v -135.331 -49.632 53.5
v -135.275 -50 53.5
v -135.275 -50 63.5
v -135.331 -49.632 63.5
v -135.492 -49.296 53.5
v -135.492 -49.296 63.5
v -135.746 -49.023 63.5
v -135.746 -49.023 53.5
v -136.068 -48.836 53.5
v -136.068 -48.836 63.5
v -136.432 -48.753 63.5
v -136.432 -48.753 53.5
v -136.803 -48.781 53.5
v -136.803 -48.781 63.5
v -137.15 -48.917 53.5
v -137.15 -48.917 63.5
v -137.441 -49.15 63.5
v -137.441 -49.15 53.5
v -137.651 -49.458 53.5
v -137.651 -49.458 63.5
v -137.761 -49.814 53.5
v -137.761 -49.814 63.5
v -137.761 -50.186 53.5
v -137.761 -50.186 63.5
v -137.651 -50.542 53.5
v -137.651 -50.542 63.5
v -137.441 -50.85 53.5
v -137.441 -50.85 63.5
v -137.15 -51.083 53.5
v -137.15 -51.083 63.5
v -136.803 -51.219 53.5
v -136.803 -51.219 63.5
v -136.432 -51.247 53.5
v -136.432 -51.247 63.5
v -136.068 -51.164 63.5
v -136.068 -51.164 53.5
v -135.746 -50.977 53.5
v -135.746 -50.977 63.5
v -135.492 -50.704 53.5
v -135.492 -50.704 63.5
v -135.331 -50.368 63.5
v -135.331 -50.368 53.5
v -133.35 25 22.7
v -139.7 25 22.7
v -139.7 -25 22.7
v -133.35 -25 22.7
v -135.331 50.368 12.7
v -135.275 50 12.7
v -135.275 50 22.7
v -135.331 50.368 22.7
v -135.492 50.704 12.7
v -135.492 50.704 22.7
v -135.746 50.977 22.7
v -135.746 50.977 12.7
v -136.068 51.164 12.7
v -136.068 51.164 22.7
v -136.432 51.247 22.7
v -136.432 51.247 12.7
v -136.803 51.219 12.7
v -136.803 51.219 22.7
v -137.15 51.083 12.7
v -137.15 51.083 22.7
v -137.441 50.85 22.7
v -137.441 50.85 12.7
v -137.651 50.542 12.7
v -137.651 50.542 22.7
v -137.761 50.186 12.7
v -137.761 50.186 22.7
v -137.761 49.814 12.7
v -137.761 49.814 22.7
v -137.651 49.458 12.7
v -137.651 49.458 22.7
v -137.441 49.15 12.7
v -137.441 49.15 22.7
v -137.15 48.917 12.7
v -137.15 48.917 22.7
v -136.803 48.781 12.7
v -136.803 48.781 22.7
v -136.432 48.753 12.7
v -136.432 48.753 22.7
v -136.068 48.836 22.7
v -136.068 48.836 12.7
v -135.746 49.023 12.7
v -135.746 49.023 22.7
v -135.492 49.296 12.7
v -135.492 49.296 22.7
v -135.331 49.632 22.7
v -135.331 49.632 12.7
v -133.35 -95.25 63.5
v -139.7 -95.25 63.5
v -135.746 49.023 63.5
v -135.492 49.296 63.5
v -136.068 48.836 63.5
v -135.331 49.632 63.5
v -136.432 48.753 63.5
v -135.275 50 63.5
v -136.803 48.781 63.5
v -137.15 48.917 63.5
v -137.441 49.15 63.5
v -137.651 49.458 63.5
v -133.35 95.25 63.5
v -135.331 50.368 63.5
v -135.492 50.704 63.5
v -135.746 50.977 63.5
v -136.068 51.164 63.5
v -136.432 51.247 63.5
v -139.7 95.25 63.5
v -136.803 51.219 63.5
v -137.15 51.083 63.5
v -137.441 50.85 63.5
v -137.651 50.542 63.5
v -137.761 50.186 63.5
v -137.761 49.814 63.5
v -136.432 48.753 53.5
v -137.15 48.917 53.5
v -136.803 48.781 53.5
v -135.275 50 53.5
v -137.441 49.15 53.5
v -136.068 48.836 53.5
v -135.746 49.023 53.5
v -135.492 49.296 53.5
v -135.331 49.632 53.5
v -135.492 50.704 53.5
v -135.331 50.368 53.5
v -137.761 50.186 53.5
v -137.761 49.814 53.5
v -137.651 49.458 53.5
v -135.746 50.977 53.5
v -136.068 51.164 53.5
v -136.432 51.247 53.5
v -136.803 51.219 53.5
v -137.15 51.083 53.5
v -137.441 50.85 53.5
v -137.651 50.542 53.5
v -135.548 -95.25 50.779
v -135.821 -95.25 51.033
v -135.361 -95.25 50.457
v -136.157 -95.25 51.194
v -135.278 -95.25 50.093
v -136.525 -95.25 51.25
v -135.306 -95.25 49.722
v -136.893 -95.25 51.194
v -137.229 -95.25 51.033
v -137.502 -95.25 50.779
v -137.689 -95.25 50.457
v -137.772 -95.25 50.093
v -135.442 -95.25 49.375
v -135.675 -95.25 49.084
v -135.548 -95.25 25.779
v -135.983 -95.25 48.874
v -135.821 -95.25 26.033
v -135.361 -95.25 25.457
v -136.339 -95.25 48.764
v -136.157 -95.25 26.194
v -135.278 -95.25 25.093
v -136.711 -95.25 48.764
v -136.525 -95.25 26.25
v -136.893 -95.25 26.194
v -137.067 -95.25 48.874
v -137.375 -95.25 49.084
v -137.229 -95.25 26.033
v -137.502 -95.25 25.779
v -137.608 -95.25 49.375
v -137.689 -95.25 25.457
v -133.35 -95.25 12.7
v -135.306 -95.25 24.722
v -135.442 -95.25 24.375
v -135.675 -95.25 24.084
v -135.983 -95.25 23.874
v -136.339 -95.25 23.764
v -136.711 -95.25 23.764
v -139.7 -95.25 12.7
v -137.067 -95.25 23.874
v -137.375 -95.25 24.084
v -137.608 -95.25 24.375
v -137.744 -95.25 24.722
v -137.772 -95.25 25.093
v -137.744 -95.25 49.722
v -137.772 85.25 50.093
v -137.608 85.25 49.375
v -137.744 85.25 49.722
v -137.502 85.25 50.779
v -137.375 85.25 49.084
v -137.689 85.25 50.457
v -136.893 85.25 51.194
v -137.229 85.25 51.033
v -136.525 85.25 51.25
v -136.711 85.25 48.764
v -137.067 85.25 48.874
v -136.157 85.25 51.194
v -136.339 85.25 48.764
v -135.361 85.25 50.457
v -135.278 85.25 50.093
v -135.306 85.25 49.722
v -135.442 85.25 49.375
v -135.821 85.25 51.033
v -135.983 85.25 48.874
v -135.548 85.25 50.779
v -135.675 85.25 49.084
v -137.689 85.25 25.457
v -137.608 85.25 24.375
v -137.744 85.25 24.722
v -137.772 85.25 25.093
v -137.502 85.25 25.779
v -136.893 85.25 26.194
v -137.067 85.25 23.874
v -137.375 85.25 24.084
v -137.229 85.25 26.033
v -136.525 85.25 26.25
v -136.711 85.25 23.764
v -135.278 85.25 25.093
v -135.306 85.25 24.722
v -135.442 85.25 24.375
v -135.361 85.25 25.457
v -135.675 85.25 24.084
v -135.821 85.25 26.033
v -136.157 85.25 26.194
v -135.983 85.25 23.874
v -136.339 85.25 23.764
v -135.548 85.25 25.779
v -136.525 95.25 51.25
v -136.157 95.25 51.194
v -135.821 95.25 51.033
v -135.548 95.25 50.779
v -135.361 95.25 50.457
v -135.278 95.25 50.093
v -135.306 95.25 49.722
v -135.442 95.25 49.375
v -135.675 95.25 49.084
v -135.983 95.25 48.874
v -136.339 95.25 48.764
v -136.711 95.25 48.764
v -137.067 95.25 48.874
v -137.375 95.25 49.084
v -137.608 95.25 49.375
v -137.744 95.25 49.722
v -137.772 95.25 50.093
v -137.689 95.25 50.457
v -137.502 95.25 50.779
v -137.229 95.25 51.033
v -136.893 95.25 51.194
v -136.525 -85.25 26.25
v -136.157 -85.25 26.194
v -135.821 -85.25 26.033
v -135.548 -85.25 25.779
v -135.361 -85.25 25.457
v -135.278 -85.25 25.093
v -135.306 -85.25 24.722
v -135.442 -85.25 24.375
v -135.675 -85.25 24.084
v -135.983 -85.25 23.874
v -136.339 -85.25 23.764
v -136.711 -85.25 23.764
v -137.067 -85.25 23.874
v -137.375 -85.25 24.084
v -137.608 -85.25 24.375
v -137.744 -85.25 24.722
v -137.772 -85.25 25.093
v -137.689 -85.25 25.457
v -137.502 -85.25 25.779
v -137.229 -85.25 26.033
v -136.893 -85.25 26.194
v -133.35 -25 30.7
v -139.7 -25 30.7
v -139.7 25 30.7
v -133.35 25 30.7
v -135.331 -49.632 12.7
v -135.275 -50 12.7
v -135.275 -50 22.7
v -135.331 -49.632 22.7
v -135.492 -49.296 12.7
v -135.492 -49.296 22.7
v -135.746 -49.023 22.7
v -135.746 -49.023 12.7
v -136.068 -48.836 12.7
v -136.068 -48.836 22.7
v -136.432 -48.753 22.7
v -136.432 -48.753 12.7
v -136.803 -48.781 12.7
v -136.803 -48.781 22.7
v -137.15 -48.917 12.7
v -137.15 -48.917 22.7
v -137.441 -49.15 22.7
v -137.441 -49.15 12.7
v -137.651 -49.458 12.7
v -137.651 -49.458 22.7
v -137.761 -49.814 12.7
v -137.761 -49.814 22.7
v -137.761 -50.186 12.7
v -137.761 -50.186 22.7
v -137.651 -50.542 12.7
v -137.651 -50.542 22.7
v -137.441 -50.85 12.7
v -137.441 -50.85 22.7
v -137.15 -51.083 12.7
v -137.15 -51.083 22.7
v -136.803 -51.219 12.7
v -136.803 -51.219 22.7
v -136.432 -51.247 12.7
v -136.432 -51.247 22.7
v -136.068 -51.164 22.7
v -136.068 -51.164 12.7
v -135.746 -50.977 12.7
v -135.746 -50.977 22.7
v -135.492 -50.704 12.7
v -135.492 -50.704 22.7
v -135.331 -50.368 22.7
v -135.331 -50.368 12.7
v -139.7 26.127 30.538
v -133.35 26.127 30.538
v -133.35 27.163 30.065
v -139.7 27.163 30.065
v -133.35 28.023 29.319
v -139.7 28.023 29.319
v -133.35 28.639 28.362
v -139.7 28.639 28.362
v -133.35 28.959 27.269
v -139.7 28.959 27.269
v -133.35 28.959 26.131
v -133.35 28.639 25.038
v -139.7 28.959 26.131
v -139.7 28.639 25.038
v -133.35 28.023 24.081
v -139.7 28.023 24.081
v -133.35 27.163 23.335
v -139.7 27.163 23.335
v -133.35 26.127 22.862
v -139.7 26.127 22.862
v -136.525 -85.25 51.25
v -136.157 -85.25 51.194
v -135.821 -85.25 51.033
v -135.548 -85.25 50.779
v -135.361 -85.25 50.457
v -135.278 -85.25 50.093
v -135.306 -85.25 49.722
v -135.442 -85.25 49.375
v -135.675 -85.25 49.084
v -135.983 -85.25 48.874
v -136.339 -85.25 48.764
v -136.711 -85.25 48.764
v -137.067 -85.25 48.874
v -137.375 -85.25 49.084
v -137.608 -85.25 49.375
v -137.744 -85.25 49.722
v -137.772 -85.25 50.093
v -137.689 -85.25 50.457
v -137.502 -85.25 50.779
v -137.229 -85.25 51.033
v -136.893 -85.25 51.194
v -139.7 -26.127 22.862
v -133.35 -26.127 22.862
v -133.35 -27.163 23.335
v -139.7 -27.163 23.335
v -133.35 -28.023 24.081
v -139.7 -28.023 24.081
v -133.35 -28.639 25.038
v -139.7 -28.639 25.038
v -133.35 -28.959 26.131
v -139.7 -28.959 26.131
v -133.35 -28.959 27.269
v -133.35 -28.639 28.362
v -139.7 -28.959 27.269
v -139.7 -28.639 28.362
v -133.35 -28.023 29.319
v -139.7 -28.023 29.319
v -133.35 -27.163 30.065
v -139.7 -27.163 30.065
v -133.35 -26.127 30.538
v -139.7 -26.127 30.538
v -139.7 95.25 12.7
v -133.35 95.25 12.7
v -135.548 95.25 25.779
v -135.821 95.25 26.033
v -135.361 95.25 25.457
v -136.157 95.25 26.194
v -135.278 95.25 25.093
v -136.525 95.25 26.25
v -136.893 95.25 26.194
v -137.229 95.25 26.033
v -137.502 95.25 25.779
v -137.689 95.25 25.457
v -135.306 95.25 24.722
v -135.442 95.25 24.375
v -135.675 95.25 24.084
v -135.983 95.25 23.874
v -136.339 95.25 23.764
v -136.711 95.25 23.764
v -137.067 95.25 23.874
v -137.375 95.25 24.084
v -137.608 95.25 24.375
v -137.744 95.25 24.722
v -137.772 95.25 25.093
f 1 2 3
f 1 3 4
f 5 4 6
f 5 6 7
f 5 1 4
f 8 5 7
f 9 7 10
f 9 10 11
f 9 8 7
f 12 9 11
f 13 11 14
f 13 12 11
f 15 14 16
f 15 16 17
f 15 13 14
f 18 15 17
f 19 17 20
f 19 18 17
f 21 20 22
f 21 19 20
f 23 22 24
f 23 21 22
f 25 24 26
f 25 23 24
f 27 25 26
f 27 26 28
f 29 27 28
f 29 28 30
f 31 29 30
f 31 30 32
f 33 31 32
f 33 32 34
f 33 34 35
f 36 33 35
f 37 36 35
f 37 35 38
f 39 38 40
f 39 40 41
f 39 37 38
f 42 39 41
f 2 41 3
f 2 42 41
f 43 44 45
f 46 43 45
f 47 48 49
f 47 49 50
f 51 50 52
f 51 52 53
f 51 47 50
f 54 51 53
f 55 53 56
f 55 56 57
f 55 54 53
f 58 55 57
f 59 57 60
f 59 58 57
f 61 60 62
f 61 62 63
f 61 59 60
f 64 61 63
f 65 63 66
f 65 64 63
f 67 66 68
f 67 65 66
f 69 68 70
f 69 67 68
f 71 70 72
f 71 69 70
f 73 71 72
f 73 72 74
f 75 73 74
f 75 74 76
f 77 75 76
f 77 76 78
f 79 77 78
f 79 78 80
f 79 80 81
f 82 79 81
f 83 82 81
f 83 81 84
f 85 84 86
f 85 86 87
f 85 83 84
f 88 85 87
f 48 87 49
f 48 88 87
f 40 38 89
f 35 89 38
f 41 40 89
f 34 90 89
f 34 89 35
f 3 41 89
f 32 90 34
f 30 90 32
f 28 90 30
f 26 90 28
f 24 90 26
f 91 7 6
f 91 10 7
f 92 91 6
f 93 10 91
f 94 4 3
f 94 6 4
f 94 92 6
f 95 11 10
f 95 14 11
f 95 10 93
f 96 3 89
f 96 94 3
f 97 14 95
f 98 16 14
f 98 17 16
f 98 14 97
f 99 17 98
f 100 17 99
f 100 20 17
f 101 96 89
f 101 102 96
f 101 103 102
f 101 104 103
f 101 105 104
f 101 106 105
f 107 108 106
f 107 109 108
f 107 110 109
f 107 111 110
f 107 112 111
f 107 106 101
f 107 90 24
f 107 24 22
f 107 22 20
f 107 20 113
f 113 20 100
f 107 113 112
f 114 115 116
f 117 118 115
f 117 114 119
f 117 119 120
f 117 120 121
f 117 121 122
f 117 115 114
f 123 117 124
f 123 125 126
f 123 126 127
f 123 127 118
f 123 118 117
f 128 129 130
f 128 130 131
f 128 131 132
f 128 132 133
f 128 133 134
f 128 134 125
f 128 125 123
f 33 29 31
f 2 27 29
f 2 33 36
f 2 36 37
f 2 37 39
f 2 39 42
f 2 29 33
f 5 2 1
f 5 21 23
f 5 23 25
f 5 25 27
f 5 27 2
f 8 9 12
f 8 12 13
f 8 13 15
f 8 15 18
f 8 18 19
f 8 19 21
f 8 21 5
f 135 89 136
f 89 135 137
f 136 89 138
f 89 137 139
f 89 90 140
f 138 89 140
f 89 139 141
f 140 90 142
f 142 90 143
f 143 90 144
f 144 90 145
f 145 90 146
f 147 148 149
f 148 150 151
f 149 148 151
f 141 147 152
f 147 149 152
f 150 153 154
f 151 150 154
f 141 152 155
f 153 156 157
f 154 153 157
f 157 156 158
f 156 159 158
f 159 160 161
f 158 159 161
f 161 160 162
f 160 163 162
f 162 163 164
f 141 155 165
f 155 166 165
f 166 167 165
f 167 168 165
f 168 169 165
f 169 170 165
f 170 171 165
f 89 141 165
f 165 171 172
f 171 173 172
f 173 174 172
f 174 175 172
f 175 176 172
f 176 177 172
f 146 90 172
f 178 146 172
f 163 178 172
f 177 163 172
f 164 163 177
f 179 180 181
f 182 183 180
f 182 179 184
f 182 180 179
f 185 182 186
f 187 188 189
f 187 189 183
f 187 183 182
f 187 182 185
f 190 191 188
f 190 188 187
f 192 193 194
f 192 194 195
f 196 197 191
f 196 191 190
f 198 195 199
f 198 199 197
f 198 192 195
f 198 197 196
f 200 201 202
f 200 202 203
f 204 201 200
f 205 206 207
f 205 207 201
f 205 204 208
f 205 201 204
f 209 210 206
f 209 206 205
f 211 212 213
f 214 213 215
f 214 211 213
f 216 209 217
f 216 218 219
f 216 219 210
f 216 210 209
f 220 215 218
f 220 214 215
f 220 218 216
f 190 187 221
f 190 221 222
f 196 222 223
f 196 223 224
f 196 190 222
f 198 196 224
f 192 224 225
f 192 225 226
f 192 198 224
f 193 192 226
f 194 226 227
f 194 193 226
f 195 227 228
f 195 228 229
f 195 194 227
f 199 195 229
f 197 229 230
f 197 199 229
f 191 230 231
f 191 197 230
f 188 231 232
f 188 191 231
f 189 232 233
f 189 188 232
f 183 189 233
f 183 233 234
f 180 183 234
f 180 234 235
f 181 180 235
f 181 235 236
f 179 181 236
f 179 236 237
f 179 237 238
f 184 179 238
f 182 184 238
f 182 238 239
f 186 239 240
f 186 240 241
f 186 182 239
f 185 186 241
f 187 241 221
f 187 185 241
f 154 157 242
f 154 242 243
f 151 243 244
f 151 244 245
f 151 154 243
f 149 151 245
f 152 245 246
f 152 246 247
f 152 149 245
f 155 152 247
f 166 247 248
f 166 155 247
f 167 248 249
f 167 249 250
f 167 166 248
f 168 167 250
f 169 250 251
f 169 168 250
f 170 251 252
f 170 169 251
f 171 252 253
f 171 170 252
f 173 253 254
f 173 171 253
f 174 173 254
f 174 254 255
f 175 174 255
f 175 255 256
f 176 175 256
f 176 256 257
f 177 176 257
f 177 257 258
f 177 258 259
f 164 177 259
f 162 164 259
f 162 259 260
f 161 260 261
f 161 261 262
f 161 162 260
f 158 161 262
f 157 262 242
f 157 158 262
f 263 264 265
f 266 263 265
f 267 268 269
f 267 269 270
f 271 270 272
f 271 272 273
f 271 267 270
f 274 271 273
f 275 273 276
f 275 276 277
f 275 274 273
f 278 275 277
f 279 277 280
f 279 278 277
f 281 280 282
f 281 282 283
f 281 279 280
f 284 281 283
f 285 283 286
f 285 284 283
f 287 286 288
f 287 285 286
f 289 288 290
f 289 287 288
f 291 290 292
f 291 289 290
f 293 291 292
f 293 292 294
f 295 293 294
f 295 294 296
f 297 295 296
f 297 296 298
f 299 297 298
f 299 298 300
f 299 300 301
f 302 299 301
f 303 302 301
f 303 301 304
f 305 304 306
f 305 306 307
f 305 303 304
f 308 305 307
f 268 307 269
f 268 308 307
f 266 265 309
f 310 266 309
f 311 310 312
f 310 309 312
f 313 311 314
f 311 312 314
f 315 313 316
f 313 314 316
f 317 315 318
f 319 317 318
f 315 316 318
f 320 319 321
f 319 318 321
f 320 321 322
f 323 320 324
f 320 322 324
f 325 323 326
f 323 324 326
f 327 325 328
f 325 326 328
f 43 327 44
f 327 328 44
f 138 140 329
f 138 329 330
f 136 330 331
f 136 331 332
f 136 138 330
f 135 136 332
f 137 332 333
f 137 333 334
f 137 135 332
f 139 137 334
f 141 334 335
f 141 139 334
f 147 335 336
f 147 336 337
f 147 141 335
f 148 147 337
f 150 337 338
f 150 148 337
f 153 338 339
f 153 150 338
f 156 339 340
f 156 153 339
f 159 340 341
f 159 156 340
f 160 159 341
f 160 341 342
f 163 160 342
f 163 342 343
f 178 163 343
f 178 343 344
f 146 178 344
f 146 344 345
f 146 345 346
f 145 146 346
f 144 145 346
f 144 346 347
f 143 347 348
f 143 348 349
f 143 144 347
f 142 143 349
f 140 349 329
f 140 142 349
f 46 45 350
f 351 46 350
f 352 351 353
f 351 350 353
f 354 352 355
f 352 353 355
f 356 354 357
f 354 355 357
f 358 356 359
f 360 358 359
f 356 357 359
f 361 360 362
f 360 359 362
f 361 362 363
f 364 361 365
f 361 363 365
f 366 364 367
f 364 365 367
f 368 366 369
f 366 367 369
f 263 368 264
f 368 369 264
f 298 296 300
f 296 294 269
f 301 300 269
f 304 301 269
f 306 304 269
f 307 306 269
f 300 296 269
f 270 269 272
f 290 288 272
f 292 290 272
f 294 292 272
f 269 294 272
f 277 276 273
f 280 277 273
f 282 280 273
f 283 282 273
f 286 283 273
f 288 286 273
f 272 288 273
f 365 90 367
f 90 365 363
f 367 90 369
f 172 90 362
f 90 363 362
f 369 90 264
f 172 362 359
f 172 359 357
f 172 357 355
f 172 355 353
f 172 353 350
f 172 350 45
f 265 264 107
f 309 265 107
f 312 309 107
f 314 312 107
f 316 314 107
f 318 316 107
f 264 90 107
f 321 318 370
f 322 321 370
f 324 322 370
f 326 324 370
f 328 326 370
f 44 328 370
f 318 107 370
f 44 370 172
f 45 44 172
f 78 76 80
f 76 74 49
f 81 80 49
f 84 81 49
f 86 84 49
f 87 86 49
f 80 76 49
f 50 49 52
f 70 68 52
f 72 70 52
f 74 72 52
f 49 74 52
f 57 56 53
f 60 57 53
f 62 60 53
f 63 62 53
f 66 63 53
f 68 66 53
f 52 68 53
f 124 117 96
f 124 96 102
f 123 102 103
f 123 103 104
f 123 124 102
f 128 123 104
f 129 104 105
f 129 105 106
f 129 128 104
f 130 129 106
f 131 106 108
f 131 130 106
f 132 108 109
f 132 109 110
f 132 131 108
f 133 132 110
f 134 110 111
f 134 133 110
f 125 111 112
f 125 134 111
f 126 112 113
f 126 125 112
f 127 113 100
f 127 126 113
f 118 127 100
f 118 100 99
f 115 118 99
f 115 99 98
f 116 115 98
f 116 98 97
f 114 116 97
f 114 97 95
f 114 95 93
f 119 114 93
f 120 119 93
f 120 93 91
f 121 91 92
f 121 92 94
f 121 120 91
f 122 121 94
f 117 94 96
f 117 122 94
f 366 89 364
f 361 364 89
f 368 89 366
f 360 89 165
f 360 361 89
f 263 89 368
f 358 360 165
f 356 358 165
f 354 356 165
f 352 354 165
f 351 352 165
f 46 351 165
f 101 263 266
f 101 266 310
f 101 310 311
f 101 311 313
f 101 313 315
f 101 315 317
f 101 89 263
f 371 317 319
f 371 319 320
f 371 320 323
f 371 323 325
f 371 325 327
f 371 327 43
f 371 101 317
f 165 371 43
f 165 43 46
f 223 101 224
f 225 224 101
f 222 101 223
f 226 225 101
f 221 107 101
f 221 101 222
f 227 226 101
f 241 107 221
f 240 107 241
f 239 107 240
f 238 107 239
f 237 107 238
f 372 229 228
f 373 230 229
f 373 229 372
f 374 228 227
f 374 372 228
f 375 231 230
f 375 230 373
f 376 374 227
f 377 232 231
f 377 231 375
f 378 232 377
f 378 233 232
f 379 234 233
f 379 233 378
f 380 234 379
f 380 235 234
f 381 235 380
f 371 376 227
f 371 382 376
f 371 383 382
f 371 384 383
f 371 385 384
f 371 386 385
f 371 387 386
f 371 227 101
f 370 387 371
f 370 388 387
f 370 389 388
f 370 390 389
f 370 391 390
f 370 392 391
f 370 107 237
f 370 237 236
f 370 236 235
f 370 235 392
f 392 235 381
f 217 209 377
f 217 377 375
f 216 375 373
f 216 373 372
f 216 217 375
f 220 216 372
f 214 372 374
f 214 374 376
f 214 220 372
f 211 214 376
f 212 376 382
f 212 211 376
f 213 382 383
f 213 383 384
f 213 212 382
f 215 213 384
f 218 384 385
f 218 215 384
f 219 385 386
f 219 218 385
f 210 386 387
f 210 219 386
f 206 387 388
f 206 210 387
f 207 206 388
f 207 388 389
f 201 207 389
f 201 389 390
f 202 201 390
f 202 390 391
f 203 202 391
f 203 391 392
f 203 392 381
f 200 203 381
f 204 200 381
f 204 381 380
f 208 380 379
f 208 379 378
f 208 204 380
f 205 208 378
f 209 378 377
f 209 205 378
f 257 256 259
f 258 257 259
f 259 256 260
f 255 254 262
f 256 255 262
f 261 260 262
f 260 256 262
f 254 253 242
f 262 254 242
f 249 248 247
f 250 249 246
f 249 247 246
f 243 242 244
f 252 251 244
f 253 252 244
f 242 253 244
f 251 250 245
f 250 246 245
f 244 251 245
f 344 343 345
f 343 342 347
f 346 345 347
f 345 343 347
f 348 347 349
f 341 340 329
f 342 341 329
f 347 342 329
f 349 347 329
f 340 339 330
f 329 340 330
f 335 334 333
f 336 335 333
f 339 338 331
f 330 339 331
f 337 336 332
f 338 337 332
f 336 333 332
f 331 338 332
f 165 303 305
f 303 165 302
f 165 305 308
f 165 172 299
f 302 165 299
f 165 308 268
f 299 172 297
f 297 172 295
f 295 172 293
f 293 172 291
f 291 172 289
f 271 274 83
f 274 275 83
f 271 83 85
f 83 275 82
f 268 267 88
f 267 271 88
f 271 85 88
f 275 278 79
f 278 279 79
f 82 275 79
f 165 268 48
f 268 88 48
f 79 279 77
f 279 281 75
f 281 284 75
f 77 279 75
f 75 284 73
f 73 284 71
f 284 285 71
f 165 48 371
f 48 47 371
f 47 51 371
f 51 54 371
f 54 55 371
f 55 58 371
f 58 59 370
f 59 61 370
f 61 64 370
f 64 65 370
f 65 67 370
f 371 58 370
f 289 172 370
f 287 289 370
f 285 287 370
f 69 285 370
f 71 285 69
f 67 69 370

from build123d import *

# Parameters (mm, degrees)
PARED_X_1_4IN_START           = -139.7
CROQUIS1_W                    = 50.8
CROQUIS1_H                    = 190.5
PARED_X_1_4IN_DEPTH           = 6.35
ROSCA_M3_INFERIOR_START       = 12.7
CROQUIS2_R                    = 1.25
ROSCA_M3_INFERIOR_DEPTH       = 10
ROSCA_M3_SUPERIOR_START       = 53.5
CROQUIS3_R                    = 1.25
ROSCA_M3_SUPERIOR_DEPTH       = 10
ROSCA_M3_ESQUINA_Y_START      = 85.25
CROQUIS4_R                    = 1.25
ROSCA_M3_ESQUINA_Y_DEPTH      = 10
ROSCA_M3_ESQUINA_Y_START_2    = -95.25
CROQUIS5_R                    = 1.25
ROSCA_M3_ESQUINA_Y_2_DEPTH    = 10
PASO_CABLE_ALIMENTACION_START = -139.7
PASO_CABLE_ALIMENTACION_DEPTH = 6.35


with BuildPart() as part:
    # Croquis1 → Pared_X_1-4in (new body)
    with BuildSketch(Plane(origin=(0, 0, 0), x_dir=(0, 0, -1), z_dir=(1, 0, 0)).offset(PARED_X_1_4IN_START)):
        with Locations((-38.1, 0)):
            Rectangle(CROQUIS1_W, CROQUIS1_H)
    extrude(amount=PARED_X_1_4IN_DEPTH)

    # Croquis2 → Rosca_M3_inferior (cut)
    with BuildSketch(Plane.XY.offset(ROSCA_M3_INFERIOR_START)):
        with Locations((-136.525, -50)):
            Circle(CROQUIS2_R)
        with Locations((-136.525, 50)):
            Circle(CROQUIS2_R)
    extrude(amount=ROSCA_M3_INFERIOR_DEPTH, mode=Mode.SUBTRACT)

    # Croquis3 → Rosca_M3_superior (cut)
    with BuildSketch(Plane.XY.offset(ROSCA_M3_SUPERIOR_START)):
        with Locations((-136.525, -50)):
            Circle(CROQUIS3_R)
        with Locations((-136.525, 50)):
            Circle(CROQUIS3_R)
    extrude(amount=ROSCA_M3_SUPERIOR_DEPTH, mode=Mode.SUBTRACT)

    # Croquis4 → Rosca_M3_esquina__Y (cut)
    with BuildSketch(Plane(origin=(0, 0, 0), x_dir=(1, 0, 0), z_dir=(0, 1, 0)).offset(ROSCA_M3_ESQUINA_Y_START)):
        with Locations(Location((-136.525, -25, 0), (0, 0, 270))):
            Circle(CROQUIS4_R)
        with Locations(Location((-136.525, -50, 0), (0, 0, 270))):
            Circle(CROQUIS4_R)
    extrude(amount=ROSCA_M3_ESQUINA_Y_DEPTH, mode=Mode.SUBTRACT)

    # Croquis5 → Rosca_M3_esquina_-Y 2 (cut)
    with BuildSketch(Plane(origin=(0, 0, 0), x_dir=(1, 0, 0), z_dir=(0, 1, 0)).offset(ROSCA_M3_ESQUINA_Y_START_2)):
        with Locations(Location((-136.525, -25, 0), (0, 0, 270))):
            Circle(CROQUIS5_R)
        with Locations(Location((-136.525, -50, 0), (0, 0, 270))):
            Circle(CROQUIS5_R)
    extrude(amount=ROSCA_M3_ESQUINA_Y_2_DEPTH, mode=Mode.SUBTRACT)

    # Croquis6 → Paso_cable_alimentacion (cut)
    with BuildSketch(Plane(origin=(0, 0, 0), x_dir=(0, 0, -1), z_dir=(1, 0, 0)).offset(PASO_CABLE_ALIMENTACION_START)):
        with BuildLine():
            Line((-30.7, -25), (-30.7, 25))
            ThreePointArc((-30.7, 25), (-26.7, 29), (-22.7, 25))
            Line((-22.7, 25), (-22.7, -25))
            ThreePointArc((-22.7, -25), (-26.7, -29), (-30.7, -25))
        make_face()
    extrude(amount=PASO_CABLE_ALIMENTACION_DEPTH, mode=Mode.SUBTRACT)


solid = part.part
